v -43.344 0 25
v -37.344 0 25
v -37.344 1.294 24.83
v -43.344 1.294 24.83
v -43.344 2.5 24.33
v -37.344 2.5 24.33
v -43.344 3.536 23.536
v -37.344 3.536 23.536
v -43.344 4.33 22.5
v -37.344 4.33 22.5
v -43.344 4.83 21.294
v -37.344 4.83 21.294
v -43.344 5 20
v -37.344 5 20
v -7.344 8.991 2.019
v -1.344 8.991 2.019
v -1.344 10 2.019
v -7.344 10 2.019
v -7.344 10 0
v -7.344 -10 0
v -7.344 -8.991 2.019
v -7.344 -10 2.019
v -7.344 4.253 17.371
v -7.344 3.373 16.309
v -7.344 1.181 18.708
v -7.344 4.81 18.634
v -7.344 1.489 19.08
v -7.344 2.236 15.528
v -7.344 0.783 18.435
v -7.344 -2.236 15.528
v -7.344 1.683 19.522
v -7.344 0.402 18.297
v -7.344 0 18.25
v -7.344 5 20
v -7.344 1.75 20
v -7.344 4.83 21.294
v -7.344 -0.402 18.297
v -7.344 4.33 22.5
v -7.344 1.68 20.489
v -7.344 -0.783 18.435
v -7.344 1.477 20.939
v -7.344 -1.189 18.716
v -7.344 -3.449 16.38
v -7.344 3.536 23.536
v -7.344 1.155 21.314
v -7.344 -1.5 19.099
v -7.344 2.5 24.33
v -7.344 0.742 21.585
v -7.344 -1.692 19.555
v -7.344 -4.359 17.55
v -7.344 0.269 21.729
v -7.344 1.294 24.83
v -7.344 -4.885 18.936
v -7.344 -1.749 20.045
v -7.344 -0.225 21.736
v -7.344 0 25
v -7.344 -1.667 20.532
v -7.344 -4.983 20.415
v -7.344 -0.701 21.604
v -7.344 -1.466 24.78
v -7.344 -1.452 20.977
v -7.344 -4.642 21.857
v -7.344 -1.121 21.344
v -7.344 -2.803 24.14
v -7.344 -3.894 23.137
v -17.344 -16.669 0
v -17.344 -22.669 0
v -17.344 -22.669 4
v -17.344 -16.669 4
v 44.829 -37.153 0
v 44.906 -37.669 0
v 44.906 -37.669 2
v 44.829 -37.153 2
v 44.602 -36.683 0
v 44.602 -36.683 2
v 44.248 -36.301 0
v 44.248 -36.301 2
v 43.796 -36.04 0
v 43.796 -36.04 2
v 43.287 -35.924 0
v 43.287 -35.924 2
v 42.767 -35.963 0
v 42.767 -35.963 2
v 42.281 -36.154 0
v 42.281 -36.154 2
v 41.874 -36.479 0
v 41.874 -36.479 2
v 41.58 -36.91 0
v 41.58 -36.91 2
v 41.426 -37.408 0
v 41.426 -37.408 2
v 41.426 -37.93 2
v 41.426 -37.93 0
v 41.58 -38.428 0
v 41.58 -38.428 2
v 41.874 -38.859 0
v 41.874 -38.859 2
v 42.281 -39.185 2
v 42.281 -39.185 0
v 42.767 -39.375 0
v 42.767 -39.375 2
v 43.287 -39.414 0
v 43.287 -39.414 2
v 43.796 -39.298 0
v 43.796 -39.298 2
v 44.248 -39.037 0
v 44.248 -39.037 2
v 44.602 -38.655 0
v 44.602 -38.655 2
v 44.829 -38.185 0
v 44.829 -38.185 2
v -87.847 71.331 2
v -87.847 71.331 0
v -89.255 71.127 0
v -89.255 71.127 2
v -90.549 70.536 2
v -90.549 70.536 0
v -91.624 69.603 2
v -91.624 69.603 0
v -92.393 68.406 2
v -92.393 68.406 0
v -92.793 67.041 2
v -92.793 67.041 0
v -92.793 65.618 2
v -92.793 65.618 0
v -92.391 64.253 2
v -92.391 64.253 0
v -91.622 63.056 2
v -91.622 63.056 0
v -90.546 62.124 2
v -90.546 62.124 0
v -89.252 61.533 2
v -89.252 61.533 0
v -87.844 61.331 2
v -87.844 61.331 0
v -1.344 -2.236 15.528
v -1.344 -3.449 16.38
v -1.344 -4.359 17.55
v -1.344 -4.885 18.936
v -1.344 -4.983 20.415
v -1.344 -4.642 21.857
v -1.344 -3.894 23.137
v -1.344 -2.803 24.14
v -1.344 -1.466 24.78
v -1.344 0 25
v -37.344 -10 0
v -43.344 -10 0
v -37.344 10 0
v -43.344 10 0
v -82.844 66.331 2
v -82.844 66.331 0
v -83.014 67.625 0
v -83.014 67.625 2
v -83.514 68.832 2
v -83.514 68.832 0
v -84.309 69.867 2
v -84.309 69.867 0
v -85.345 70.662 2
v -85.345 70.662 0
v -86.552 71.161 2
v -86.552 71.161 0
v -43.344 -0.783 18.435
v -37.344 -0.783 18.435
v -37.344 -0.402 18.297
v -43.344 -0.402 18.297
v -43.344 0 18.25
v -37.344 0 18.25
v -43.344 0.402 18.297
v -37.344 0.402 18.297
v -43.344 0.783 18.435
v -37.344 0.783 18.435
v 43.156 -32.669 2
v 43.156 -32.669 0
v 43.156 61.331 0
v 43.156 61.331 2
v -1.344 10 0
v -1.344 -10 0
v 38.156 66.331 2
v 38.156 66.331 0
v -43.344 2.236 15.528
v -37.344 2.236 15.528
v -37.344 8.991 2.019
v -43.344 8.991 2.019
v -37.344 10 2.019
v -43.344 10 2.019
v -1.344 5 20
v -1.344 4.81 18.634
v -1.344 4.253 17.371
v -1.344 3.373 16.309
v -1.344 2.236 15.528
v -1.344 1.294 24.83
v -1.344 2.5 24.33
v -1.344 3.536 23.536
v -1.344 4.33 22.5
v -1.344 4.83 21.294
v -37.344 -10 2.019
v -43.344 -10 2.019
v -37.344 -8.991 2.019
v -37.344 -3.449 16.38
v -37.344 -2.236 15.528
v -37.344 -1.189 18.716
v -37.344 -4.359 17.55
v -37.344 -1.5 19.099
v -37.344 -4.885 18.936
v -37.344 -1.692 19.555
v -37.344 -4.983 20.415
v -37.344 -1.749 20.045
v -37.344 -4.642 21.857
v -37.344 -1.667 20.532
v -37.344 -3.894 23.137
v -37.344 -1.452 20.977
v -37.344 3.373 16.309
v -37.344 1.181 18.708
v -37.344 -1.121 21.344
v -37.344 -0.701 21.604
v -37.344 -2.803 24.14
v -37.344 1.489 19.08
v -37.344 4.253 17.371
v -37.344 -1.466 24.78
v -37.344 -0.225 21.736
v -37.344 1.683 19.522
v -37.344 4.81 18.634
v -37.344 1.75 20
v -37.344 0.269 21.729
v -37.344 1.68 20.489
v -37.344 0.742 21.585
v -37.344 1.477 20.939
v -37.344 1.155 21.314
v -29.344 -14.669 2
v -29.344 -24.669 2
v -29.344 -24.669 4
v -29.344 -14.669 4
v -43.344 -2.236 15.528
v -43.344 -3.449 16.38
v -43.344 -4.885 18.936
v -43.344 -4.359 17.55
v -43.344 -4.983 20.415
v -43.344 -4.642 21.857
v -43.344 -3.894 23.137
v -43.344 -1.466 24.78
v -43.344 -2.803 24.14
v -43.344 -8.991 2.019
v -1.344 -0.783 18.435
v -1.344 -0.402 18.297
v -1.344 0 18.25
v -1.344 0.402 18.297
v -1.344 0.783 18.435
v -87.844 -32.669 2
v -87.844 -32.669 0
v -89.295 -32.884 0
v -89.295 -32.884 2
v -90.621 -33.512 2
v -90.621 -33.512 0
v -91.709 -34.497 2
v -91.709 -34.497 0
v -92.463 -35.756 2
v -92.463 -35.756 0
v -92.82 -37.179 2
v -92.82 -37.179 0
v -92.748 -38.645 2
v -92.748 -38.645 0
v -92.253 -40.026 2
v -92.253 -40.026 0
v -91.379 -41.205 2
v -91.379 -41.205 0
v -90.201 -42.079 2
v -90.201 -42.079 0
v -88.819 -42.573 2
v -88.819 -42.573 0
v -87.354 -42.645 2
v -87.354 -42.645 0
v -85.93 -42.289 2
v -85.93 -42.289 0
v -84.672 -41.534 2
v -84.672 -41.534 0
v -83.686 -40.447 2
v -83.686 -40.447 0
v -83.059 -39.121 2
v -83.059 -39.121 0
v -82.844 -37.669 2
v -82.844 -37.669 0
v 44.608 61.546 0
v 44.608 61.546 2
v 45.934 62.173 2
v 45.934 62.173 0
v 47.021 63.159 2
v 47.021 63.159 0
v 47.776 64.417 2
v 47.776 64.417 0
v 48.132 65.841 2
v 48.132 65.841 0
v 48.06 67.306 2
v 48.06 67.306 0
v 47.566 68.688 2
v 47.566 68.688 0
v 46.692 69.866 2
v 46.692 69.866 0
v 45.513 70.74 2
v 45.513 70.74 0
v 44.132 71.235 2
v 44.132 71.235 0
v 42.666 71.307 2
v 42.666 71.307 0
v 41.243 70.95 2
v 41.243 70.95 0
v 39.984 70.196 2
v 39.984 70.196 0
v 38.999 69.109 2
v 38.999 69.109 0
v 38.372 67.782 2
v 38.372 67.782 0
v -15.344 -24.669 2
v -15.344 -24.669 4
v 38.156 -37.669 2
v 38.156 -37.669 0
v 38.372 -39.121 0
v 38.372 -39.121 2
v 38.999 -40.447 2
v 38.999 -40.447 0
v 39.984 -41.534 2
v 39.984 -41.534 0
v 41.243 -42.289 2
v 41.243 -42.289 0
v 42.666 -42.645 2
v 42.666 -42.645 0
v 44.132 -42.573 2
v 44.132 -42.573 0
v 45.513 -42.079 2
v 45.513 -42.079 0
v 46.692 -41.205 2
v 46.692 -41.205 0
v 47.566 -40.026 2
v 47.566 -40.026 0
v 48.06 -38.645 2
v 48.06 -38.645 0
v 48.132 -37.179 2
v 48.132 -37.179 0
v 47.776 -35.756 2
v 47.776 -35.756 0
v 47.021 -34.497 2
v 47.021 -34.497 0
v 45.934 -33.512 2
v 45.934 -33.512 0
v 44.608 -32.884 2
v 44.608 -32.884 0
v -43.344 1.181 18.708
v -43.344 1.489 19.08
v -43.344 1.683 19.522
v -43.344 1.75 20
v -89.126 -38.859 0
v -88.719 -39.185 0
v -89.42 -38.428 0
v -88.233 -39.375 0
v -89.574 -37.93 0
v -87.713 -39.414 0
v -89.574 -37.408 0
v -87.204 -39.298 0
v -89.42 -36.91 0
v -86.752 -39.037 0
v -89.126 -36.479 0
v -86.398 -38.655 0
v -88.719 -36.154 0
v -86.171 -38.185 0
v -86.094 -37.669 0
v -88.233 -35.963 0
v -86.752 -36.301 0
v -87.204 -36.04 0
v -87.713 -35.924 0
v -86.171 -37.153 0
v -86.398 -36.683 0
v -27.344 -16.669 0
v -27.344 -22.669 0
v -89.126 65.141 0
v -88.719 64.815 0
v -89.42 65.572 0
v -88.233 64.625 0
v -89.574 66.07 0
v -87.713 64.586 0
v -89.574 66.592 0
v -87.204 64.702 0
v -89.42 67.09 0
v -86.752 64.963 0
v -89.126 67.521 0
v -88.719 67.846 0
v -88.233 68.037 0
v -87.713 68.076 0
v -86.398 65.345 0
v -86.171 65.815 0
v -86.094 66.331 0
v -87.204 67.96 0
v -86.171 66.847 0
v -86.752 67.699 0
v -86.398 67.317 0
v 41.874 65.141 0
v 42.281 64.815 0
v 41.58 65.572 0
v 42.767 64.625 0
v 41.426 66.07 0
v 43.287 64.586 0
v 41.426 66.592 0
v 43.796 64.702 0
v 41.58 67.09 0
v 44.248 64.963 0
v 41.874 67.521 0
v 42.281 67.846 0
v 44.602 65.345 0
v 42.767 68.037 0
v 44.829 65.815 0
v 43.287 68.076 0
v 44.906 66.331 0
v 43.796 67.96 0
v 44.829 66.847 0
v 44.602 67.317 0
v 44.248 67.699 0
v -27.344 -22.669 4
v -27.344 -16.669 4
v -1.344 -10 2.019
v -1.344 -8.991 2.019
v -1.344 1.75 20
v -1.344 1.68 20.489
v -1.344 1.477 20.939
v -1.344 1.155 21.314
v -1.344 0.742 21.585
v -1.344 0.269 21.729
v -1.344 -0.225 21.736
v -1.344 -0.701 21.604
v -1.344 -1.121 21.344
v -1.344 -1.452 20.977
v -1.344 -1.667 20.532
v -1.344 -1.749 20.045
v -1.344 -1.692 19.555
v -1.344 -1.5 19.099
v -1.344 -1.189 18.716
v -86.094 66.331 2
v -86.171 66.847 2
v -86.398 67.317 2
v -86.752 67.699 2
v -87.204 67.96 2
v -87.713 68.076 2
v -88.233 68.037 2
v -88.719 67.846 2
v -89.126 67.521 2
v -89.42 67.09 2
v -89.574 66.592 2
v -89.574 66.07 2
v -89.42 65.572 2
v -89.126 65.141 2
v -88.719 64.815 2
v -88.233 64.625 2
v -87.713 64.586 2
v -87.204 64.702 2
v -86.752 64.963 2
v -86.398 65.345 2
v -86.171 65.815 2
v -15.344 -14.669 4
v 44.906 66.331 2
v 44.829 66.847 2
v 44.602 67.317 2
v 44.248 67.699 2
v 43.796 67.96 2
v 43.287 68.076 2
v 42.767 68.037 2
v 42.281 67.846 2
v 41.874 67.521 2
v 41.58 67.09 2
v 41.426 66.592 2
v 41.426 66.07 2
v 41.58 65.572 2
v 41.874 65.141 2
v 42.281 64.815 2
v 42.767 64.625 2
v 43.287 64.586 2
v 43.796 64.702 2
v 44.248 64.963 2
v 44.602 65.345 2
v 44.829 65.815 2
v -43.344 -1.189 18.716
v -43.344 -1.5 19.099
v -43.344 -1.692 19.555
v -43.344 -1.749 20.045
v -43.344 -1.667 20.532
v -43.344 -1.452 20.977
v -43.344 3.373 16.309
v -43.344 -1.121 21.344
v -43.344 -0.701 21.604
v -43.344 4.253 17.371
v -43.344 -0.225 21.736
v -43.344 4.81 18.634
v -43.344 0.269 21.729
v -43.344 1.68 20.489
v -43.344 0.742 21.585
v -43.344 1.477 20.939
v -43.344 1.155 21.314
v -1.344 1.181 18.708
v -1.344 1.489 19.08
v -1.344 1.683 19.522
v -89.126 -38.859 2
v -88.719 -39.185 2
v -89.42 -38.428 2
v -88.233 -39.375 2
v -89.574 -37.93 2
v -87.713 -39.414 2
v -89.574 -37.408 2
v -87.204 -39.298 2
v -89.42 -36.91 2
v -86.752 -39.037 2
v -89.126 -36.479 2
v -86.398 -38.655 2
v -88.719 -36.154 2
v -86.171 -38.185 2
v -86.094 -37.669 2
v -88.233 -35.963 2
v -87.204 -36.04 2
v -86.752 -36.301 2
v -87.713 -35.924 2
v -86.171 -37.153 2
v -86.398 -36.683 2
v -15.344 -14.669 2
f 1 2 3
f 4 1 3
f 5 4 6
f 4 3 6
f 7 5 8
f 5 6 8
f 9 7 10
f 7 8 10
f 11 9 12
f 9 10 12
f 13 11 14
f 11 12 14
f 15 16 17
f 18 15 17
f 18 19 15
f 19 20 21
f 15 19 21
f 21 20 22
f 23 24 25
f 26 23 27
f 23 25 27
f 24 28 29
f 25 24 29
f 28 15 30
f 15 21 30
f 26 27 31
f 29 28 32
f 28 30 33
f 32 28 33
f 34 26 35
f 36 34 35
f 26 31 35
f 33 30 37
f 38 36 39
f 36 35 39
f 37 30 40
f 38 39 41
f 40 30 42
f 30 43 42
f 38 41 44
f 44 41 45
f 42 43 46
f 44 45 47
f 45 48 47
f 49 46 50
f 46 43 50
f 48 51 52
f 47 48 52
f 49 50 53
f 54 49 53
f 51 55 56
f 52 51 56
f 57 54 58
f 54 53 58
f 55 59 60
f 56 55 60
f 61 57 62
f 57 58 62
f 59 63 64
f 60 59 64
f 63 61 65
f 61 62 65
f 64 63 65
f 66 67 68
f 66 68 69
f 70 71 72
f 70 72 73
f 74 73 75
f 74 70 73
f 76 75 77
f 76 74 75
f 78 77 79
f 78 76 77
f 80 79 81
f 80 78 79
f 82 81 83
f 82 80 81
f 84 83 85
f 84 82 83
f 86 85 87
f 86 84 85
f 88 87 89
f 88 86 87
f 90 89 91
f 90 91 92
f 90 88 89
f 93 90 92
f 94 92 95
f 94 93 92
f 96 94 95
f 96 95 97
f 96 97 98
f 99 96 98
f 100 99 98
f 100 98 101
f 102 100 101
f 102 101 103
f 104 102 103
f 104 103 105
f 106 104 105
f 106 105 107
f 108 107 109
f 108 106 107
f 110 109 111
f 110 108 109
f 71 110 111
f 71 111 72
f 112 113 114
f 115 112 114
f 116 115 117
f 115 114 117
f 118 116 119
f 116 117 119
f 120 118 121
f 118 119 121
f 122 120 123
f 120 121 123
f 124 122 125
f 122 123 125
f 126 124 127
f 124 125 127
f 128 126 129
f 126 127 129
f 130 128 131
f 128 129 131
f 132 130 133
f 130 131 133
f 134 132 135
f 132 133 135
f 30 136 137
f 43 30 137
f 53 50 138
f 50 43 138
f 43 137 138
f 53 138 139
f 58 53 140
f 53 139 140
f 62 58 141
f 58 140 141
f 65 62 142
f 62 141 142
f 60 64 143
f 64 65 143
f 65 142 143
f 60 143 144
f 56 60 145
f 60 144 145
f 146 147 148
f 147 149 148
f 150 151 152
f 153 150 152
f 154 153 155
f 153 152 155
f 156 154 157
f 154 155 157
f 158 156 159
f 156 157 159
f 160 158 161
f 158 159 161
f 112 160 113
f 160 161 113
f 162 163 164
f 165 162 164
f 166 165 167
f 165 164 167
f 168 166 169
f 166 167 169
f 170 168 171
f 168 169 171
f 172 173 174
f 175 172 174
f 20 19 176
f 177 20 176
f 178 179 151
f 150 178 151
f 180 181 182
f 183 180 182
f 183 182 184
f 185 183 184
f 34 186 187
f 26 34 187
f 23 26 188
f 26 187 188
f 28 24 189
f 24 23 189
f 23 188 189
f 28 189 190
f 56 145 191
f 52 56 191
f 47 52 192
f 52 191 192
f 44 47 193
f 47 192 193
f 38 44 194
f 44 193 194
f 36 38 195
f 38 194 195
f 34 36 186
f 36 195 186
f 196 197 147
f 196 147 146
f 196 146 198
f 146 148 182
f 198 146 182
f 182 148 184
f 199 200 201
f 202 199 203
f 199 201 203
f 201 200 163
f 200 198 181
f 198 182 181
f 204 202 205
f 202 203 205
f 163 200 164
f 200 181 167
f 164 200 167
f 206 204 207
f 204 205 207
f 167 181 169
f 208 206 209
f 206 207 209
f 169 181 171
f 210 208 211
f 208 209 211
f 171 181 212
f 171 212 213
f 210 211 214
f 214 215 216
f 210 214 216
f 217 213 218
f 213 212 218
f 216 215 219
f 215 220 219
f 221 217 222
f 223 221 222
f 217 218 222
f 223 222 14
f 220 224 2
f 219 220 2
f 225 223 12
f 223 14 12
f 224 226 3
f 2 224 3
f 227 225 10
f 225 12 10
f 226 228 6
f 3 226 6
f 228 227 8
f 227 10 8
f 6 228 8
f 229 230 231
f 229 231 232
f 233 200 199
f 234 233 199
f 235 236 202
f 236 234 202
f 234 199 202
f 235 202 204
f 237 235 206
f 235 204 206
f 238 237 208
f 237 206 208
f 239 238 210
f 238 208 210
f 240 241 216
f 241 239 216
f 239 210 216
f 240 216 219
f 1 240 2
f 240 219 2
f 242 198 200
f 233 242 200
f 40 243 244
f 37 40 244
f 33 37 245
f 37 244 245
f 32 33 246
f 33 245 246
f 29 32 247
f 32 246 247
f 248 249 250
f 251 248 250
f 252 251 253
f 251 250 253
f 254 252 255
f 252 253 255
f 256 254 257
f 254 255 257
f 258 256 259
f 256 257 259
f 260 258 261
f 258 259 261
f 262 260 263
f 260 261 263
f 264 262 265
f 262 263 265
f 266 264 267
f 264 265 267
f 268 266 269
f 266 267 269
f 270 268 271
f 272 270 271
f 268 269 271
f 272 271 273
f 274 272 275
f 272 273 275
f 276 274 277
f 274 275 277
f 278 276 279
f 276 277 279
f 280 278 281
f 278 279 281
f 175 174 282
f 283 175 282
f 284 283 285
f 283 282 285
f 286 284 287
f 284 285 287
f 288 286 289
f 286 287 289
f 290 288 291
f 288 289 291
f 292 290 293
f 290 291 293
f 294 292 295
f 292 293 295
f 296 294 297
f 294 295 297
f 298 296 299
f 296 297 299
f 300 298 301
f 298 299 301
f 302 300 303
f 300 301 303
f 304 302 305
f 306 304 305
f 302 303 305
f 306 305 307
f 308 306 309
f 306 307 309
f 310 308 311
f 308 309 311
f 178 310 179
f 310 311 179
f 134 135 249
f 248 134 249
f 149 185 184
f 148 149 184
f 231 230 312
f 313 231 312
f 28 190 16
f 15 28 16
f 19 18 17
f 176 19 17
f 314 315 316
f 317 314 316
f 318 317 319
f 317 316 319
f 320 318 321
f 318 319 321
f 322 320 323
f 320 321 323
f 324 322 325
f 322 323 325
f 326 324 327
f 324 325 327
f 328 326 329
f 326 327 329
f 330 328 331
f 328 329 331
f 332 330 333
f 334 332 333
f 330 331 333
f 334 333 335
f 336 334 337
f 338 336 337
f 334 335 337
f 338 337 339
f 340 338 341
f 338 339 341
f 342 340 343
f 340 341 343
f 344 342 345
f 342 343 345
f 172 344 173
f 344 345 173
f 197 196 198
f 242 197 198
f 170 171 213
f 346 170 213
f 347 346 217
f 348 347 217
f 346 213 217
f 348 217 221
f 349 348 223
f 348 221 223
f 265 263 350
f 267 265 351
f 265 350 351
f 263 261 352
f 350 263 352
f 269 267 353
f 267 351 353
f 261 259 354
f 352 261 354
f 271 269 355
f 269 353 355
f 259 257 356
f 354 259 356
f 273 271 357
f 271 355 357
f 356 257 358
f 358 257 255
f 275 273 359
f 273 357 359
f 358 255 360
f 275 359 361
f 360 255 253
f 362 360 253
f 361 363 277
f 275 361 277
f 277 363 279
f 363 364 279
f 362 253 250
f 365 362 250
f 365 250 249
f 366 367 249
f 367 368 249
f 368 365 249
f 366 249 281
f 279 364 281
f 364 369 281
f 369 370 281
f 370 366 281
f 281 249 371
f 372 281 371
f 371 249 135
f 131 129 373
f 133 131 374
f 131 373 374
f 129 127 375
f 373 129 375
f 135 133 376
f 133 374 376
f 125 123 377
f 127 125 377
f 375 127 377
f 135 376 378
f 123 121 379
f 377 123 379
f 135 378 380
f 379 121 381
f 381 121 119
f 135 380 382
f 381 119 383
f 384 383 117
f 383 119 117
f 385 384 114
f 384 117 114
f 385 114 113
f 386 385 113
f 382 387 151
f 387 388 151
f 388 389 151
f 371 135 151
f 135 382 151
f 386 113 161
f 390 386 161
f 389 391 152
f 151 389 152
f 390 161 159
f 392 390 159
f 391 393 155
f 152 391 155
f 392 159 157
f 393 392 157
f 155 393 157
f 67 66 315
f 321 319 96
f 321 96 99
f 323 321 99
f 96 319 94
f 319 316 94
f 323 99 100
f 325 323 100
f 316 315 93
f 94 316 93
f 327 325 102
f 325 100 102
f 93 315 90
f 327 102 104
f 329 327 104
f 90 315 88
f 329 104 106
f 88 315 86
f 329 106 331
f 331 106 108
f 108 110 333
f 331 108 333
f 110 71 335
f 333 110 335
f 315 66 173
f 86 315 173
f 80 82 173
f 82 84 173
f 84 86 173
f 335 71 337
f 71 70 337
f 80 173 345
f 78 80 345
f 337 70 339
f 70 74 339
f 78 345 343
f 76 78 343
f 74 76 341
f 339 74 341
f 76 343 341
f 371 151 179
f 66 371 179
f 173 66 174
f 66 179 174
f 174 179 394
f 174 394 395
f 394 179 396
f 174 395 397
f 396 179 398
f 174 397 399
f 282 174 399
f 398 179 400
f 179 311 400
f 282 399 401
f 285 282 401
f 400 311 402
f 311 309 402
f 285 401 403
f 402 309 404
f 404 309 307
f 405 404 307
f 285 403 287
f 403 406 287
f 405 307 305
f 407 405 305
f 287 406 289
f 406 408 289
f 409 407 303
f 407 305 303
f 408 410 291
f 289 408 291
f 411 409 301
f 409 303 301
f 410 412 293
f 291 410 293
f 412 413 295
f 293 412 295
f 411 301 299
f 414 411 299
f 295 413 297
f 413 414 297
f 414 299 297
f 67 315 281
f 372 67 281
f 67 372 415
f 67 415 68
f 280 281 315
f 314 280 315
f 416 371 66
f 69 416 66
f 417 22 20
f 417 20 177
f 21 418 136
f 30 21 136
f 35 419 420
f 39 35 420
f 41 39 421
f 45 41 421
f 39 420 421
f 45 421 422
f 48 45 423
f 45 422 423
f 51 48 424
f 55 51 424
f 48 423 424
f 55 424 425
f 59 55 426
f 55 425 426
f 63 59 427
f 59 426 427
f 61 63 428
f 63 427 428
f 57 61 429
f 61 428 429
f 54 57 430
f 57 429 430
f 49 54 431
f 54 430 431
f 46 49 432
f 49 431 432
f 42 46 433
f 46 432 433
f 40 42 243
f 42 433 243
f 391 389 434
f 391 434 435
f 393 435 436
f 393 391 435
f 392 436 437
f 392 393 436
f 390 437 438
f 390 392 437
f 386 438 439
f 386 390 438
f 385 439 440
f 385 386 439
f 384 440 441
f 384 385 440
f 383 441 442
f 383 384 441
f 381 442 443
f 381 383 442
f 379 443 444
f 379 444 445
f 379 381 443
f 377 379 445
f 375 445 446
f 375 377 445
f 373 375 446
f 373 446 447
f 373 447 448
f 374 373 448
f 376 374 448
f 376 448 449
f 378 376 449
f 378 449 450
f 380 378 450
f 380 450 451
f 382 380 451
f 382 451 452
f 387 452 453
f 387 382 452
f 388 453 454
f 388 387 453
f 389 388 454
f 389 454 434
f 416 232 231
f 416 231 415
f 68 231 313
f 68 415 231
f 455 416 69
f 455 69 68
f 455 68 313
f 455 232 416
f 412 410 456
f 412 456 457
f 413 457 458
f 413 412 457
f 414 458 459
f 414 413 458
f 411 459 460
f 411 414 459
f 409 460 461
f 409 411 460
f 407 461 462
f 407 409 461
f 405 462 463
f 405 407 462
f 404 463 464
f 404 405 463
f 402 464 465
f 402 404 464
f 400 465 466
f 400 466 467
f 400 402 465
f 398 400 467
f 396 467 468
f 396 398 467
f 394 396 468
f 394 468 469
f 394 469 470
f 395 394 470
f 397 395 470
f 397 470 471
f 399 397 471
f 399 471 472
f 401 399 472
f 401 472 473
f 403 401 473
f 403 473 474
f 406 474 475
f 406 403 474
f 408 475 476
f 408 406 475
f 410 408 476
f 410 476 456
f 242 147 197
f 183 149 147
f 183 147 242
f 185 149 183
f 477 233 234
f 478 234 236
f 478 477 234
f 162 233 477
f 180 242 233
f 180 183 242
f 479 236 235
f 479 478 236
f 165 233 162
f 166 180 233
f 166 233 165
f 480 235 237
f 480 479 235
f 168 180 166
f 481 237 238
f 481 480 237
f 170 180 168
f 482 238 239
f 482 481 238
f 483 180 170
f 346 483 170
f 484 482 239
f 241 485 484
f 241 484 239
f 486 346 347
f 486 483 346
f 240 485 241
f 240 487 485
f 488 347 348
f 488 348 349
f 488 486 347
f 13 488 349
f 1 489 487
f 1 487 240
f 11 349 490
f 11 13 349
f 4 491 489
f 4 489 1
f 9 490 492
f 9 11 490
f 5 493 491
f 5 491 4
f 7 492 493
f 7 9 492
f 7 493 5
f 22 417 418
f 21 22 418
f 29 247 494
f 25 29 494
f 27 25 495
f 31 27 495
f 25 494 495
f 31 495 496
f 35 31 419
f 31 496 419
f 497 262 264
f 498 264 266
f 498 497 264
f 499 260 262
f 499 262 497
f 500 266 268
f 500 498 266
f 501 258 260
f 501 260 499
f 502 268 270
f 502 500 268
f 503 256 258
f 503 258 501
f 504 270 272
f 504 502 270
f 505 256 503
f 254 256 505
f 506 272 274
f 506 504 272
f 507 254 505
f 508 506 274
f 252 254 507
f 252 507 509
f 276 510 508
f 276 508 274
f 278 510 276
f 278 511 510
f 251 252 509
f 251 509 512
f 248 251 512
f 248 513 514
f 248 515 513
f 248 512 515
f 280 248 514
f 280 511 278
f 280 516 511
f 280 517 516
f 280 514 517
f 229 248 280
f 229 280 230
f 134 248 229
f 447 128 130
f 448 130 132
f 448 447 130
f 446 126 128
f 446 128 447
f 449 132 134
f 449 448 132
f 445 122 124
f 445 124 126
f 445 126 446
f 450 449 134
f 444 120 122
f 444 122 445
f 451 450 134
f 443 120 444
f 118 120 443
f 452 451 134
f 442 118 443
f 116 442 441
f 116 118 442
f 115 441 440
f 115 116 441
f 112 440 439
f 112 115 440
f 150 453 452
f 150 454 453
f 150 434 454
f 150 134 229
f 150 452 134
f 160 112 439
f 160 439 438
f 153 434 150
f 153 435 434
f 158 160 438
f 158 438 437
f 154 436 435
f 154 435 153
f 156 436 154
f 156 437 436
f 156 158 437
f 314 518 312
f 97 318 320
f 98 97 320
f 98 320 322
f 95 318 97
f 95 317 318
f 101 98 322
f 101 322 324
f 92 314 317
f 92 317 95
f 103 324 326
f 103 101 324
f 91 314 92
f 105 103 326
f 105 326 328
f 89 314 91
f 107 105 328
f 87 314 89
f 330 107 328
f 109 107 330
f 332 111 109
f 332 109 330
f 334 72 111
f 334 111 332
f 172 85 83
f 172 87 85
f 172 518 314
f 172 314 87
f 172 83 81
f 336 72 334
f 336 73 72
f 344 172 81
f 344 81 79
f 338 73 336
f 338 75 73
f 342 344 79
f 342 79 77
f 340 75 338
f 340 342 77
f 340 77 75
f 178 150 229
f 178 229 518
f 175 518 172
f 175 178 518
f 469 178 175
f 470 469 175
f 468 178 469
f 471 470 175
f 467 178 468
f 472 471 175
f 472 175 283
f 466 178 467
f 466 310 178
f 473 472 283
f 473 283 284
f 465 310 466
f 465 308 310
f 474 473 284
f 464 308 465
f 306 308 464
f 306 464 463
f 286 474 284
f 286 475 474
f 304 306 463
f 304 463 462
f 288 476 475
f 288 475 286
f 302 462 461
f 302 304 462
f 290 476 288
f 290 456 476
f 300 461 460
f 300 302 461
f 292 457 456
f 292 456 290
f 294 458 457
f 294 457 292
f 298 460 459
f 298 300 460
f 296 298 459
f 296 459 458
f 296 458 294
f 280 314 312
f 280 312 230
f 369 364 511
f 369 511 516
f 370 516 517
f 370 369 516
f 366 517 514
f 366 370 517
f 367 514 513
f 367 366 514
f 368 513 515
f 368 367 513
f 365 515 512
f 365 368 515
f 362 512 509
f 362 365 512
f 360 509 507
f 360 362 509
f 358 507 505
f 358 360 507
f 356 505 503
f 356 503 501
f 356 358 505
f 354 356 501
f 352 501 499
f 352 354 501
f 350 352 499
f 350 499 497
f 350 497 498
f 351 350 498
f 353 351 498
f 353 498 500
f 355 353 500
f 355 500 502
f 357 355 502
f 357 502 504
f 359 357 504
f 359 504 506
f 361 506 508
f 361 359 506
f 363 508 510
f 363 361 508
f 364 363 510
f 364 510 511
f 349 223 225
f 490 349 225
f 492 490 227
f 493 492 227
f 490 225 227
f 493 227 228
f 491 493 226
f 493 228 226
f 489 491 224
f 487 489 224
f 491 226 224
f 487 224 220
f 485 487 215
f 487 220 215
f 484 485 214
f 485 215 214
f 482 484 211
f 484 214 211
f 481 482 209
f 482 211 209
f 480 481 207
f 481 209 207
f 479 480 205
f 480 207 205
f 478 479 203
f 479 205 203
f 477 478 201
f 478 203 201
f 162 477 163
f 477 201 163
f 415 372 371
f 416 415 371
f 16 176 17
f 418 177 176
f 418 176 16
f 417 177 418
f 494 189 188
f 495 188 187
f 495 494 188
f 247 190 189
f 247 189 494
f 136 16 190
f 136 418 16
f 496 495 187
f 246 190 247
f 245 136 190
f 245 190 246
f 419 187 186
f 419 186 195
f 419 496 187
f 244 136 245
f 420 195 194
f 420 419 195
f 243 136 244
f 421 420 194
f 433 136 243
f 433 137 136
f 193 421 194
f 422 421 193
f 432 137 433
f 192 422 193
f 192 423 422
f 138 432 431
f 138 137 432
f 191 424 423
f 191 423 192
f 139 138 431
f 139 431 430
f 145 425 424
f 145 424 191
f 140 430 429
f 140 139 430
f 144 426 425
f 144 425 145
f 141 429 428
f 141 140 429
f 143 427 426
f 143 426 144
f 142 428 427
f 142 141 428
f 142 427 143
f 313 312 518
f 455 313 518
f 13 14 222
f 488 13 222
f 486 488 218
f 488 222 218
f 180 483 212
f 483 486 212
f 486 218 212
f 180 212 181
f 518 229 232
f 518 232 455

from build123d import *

# Parameters (mm, degrees)
F1_W     = 6
F1_H     = 25
F2_DEPTH = 10
F0_R     = 1.75
F0_W     = 14
F0_H     = 10
F3_DEPTH = 2
F5_DEPTH = 92.844606
F0_W_2   = 10
F0_H_2   = 6
F6_DEPTH = 4


with BuildPart() as f2:
    # F1 (on Front) → F2 (new body, symmetric)
    with BuildSketch(Plane.XZ):
        with Locations((-40.343606, 12.5)):
            Rectangle(F1_W, F1_H)
        with Locations((-4.343606, 12.5)):
            Rectangle(F1_W, F1_H)
    extrude(amount=F2_DEPTH, both=True)

    # F4 (on Right) → F5 (cut, through all)
    with BuildSketch(Plane.YZ):
        with BuildLine():
            Line((8.990668, 2.018665), (10, 2.018665))
            Line((10, 2.018665), (10, 25))
            Line((10, 25), (0, 25))
            ThreePointArc((0, 25), (3.535534, 23.535534), (5, 20))
            ThreePointArc((5, 20), (4.253254, 17.371344), (2.236068, 15.527864))
            Line((2.236068, 15.527864), (8.990668, 2.018665))
        make_face()
        with BuildLine():
            Line((-10, 2.018665), (-8.990668, 2.018665))
            Line((-8.990668, 2.018665), (-2.236068, 15.527864))
            ThreePointArc((-2.236068, 15.527864), (-4.866245, 21.148765), (0, 25))
            Line((0, 25), (-10, 25))
            Line((-10, 25), (-10, 2.018665))
        make_face()
        with BuildLine():
            Line((0, 20), (0.782624, 18.434752))
            ThreePointArc((0.782624, 18.434752), (1.488639, 19.079971), (1.75, 20))
            ThreePointArc((1.75, 20), (-0.920029, 21.488639), (-0.782624, 18.434752))
            Line((-0.782624, 18.434752), (0, 20))
        make_face()
        with BuildLine():
            ThreePointArc((-0.782624, 18.434752), (0, 18.25), (0.782624, 18.434752))
            Line((0.782624, 18.434752), (0, 20))
            Line((0, 20), (-0.782624, 18.434752))
        make_face()
    extrude(amount=-F5_DEPTH, mode=Mode.SUBTRACT)


with BuildPart() as f3:
    # F0 (on Top) → F3 (new body)
    with BuildSketch(Plane.XY):
        with BuildLine():
            ThreePointArc((-82.843606, 66.330806), (-84.309227, 69.867496), (-87.846874, 71.330805))
            ThreePointArc((-87.846874, 71.330805), (-92.843606, 66.329173), (-87.843606, 61.330806))
            Line((-87.843606, 61.330806), (-87.843606, -32.669194))
            ThreePointArc((-87.843606, -32.669194), (-91.37914, -41.204727), (-82.843606, -37.669194))
            Line((-82.843606, -37.669194), (-22.343606, -37.669194))
            Line((-22.343606, -37.669194), (38.156394, -37.669194))
            ThreePointArc((38.156394, -37.669194), (46.691928, -41.204727), (43.156394, -32.669194))
            Line((43.156394, -32.669194), (43.156394, 61.330806))
            ThreePointArc((43.156394, 61.330806), (46.691928, 69.86634), (38.156394, 66.330806))
            Line((38.156394, 66.330806), (-82.843606, 66.330806))
        make_face()
        with Locations((-87.843606, -37.669194)):
            Circle(F0_R, mode=Mode.SUBTRACT)
        with Locations((-22.343606, -19.669194)):
            Rectangle(F0_W, F0_H, mode=Mode.SUBTRACT)
        with Locations((43.156394, -37.669194)):
            Circle(F0_R, mode=Mode.SUBTRACT)
        with Locations((-87.843606, 66.330806)):
            Circle(F0_R, mode=Mode.SUBTRACT)
        with Locations((43.156394, 66.330806)):
            Circle(F0_R, mode=Mode.SUBTRACT)
    extrude(amount=F3_DEPTH)

    # F0 (on Top) → F6 (join)
    with BuildSketch(Plane.XY):
        with Locations((-22.343606, -19.669194)):
            Rectangle(F0_W, F0_H)
        with Locations((-22.343606, -19.669194)):
            Rectangle(F0_W_2, F0_H_2, mode=Mode.SUBTRACT)
    extrude(amount=F6_DEPTH)


solid = Compound([f2.part, f3.part])
